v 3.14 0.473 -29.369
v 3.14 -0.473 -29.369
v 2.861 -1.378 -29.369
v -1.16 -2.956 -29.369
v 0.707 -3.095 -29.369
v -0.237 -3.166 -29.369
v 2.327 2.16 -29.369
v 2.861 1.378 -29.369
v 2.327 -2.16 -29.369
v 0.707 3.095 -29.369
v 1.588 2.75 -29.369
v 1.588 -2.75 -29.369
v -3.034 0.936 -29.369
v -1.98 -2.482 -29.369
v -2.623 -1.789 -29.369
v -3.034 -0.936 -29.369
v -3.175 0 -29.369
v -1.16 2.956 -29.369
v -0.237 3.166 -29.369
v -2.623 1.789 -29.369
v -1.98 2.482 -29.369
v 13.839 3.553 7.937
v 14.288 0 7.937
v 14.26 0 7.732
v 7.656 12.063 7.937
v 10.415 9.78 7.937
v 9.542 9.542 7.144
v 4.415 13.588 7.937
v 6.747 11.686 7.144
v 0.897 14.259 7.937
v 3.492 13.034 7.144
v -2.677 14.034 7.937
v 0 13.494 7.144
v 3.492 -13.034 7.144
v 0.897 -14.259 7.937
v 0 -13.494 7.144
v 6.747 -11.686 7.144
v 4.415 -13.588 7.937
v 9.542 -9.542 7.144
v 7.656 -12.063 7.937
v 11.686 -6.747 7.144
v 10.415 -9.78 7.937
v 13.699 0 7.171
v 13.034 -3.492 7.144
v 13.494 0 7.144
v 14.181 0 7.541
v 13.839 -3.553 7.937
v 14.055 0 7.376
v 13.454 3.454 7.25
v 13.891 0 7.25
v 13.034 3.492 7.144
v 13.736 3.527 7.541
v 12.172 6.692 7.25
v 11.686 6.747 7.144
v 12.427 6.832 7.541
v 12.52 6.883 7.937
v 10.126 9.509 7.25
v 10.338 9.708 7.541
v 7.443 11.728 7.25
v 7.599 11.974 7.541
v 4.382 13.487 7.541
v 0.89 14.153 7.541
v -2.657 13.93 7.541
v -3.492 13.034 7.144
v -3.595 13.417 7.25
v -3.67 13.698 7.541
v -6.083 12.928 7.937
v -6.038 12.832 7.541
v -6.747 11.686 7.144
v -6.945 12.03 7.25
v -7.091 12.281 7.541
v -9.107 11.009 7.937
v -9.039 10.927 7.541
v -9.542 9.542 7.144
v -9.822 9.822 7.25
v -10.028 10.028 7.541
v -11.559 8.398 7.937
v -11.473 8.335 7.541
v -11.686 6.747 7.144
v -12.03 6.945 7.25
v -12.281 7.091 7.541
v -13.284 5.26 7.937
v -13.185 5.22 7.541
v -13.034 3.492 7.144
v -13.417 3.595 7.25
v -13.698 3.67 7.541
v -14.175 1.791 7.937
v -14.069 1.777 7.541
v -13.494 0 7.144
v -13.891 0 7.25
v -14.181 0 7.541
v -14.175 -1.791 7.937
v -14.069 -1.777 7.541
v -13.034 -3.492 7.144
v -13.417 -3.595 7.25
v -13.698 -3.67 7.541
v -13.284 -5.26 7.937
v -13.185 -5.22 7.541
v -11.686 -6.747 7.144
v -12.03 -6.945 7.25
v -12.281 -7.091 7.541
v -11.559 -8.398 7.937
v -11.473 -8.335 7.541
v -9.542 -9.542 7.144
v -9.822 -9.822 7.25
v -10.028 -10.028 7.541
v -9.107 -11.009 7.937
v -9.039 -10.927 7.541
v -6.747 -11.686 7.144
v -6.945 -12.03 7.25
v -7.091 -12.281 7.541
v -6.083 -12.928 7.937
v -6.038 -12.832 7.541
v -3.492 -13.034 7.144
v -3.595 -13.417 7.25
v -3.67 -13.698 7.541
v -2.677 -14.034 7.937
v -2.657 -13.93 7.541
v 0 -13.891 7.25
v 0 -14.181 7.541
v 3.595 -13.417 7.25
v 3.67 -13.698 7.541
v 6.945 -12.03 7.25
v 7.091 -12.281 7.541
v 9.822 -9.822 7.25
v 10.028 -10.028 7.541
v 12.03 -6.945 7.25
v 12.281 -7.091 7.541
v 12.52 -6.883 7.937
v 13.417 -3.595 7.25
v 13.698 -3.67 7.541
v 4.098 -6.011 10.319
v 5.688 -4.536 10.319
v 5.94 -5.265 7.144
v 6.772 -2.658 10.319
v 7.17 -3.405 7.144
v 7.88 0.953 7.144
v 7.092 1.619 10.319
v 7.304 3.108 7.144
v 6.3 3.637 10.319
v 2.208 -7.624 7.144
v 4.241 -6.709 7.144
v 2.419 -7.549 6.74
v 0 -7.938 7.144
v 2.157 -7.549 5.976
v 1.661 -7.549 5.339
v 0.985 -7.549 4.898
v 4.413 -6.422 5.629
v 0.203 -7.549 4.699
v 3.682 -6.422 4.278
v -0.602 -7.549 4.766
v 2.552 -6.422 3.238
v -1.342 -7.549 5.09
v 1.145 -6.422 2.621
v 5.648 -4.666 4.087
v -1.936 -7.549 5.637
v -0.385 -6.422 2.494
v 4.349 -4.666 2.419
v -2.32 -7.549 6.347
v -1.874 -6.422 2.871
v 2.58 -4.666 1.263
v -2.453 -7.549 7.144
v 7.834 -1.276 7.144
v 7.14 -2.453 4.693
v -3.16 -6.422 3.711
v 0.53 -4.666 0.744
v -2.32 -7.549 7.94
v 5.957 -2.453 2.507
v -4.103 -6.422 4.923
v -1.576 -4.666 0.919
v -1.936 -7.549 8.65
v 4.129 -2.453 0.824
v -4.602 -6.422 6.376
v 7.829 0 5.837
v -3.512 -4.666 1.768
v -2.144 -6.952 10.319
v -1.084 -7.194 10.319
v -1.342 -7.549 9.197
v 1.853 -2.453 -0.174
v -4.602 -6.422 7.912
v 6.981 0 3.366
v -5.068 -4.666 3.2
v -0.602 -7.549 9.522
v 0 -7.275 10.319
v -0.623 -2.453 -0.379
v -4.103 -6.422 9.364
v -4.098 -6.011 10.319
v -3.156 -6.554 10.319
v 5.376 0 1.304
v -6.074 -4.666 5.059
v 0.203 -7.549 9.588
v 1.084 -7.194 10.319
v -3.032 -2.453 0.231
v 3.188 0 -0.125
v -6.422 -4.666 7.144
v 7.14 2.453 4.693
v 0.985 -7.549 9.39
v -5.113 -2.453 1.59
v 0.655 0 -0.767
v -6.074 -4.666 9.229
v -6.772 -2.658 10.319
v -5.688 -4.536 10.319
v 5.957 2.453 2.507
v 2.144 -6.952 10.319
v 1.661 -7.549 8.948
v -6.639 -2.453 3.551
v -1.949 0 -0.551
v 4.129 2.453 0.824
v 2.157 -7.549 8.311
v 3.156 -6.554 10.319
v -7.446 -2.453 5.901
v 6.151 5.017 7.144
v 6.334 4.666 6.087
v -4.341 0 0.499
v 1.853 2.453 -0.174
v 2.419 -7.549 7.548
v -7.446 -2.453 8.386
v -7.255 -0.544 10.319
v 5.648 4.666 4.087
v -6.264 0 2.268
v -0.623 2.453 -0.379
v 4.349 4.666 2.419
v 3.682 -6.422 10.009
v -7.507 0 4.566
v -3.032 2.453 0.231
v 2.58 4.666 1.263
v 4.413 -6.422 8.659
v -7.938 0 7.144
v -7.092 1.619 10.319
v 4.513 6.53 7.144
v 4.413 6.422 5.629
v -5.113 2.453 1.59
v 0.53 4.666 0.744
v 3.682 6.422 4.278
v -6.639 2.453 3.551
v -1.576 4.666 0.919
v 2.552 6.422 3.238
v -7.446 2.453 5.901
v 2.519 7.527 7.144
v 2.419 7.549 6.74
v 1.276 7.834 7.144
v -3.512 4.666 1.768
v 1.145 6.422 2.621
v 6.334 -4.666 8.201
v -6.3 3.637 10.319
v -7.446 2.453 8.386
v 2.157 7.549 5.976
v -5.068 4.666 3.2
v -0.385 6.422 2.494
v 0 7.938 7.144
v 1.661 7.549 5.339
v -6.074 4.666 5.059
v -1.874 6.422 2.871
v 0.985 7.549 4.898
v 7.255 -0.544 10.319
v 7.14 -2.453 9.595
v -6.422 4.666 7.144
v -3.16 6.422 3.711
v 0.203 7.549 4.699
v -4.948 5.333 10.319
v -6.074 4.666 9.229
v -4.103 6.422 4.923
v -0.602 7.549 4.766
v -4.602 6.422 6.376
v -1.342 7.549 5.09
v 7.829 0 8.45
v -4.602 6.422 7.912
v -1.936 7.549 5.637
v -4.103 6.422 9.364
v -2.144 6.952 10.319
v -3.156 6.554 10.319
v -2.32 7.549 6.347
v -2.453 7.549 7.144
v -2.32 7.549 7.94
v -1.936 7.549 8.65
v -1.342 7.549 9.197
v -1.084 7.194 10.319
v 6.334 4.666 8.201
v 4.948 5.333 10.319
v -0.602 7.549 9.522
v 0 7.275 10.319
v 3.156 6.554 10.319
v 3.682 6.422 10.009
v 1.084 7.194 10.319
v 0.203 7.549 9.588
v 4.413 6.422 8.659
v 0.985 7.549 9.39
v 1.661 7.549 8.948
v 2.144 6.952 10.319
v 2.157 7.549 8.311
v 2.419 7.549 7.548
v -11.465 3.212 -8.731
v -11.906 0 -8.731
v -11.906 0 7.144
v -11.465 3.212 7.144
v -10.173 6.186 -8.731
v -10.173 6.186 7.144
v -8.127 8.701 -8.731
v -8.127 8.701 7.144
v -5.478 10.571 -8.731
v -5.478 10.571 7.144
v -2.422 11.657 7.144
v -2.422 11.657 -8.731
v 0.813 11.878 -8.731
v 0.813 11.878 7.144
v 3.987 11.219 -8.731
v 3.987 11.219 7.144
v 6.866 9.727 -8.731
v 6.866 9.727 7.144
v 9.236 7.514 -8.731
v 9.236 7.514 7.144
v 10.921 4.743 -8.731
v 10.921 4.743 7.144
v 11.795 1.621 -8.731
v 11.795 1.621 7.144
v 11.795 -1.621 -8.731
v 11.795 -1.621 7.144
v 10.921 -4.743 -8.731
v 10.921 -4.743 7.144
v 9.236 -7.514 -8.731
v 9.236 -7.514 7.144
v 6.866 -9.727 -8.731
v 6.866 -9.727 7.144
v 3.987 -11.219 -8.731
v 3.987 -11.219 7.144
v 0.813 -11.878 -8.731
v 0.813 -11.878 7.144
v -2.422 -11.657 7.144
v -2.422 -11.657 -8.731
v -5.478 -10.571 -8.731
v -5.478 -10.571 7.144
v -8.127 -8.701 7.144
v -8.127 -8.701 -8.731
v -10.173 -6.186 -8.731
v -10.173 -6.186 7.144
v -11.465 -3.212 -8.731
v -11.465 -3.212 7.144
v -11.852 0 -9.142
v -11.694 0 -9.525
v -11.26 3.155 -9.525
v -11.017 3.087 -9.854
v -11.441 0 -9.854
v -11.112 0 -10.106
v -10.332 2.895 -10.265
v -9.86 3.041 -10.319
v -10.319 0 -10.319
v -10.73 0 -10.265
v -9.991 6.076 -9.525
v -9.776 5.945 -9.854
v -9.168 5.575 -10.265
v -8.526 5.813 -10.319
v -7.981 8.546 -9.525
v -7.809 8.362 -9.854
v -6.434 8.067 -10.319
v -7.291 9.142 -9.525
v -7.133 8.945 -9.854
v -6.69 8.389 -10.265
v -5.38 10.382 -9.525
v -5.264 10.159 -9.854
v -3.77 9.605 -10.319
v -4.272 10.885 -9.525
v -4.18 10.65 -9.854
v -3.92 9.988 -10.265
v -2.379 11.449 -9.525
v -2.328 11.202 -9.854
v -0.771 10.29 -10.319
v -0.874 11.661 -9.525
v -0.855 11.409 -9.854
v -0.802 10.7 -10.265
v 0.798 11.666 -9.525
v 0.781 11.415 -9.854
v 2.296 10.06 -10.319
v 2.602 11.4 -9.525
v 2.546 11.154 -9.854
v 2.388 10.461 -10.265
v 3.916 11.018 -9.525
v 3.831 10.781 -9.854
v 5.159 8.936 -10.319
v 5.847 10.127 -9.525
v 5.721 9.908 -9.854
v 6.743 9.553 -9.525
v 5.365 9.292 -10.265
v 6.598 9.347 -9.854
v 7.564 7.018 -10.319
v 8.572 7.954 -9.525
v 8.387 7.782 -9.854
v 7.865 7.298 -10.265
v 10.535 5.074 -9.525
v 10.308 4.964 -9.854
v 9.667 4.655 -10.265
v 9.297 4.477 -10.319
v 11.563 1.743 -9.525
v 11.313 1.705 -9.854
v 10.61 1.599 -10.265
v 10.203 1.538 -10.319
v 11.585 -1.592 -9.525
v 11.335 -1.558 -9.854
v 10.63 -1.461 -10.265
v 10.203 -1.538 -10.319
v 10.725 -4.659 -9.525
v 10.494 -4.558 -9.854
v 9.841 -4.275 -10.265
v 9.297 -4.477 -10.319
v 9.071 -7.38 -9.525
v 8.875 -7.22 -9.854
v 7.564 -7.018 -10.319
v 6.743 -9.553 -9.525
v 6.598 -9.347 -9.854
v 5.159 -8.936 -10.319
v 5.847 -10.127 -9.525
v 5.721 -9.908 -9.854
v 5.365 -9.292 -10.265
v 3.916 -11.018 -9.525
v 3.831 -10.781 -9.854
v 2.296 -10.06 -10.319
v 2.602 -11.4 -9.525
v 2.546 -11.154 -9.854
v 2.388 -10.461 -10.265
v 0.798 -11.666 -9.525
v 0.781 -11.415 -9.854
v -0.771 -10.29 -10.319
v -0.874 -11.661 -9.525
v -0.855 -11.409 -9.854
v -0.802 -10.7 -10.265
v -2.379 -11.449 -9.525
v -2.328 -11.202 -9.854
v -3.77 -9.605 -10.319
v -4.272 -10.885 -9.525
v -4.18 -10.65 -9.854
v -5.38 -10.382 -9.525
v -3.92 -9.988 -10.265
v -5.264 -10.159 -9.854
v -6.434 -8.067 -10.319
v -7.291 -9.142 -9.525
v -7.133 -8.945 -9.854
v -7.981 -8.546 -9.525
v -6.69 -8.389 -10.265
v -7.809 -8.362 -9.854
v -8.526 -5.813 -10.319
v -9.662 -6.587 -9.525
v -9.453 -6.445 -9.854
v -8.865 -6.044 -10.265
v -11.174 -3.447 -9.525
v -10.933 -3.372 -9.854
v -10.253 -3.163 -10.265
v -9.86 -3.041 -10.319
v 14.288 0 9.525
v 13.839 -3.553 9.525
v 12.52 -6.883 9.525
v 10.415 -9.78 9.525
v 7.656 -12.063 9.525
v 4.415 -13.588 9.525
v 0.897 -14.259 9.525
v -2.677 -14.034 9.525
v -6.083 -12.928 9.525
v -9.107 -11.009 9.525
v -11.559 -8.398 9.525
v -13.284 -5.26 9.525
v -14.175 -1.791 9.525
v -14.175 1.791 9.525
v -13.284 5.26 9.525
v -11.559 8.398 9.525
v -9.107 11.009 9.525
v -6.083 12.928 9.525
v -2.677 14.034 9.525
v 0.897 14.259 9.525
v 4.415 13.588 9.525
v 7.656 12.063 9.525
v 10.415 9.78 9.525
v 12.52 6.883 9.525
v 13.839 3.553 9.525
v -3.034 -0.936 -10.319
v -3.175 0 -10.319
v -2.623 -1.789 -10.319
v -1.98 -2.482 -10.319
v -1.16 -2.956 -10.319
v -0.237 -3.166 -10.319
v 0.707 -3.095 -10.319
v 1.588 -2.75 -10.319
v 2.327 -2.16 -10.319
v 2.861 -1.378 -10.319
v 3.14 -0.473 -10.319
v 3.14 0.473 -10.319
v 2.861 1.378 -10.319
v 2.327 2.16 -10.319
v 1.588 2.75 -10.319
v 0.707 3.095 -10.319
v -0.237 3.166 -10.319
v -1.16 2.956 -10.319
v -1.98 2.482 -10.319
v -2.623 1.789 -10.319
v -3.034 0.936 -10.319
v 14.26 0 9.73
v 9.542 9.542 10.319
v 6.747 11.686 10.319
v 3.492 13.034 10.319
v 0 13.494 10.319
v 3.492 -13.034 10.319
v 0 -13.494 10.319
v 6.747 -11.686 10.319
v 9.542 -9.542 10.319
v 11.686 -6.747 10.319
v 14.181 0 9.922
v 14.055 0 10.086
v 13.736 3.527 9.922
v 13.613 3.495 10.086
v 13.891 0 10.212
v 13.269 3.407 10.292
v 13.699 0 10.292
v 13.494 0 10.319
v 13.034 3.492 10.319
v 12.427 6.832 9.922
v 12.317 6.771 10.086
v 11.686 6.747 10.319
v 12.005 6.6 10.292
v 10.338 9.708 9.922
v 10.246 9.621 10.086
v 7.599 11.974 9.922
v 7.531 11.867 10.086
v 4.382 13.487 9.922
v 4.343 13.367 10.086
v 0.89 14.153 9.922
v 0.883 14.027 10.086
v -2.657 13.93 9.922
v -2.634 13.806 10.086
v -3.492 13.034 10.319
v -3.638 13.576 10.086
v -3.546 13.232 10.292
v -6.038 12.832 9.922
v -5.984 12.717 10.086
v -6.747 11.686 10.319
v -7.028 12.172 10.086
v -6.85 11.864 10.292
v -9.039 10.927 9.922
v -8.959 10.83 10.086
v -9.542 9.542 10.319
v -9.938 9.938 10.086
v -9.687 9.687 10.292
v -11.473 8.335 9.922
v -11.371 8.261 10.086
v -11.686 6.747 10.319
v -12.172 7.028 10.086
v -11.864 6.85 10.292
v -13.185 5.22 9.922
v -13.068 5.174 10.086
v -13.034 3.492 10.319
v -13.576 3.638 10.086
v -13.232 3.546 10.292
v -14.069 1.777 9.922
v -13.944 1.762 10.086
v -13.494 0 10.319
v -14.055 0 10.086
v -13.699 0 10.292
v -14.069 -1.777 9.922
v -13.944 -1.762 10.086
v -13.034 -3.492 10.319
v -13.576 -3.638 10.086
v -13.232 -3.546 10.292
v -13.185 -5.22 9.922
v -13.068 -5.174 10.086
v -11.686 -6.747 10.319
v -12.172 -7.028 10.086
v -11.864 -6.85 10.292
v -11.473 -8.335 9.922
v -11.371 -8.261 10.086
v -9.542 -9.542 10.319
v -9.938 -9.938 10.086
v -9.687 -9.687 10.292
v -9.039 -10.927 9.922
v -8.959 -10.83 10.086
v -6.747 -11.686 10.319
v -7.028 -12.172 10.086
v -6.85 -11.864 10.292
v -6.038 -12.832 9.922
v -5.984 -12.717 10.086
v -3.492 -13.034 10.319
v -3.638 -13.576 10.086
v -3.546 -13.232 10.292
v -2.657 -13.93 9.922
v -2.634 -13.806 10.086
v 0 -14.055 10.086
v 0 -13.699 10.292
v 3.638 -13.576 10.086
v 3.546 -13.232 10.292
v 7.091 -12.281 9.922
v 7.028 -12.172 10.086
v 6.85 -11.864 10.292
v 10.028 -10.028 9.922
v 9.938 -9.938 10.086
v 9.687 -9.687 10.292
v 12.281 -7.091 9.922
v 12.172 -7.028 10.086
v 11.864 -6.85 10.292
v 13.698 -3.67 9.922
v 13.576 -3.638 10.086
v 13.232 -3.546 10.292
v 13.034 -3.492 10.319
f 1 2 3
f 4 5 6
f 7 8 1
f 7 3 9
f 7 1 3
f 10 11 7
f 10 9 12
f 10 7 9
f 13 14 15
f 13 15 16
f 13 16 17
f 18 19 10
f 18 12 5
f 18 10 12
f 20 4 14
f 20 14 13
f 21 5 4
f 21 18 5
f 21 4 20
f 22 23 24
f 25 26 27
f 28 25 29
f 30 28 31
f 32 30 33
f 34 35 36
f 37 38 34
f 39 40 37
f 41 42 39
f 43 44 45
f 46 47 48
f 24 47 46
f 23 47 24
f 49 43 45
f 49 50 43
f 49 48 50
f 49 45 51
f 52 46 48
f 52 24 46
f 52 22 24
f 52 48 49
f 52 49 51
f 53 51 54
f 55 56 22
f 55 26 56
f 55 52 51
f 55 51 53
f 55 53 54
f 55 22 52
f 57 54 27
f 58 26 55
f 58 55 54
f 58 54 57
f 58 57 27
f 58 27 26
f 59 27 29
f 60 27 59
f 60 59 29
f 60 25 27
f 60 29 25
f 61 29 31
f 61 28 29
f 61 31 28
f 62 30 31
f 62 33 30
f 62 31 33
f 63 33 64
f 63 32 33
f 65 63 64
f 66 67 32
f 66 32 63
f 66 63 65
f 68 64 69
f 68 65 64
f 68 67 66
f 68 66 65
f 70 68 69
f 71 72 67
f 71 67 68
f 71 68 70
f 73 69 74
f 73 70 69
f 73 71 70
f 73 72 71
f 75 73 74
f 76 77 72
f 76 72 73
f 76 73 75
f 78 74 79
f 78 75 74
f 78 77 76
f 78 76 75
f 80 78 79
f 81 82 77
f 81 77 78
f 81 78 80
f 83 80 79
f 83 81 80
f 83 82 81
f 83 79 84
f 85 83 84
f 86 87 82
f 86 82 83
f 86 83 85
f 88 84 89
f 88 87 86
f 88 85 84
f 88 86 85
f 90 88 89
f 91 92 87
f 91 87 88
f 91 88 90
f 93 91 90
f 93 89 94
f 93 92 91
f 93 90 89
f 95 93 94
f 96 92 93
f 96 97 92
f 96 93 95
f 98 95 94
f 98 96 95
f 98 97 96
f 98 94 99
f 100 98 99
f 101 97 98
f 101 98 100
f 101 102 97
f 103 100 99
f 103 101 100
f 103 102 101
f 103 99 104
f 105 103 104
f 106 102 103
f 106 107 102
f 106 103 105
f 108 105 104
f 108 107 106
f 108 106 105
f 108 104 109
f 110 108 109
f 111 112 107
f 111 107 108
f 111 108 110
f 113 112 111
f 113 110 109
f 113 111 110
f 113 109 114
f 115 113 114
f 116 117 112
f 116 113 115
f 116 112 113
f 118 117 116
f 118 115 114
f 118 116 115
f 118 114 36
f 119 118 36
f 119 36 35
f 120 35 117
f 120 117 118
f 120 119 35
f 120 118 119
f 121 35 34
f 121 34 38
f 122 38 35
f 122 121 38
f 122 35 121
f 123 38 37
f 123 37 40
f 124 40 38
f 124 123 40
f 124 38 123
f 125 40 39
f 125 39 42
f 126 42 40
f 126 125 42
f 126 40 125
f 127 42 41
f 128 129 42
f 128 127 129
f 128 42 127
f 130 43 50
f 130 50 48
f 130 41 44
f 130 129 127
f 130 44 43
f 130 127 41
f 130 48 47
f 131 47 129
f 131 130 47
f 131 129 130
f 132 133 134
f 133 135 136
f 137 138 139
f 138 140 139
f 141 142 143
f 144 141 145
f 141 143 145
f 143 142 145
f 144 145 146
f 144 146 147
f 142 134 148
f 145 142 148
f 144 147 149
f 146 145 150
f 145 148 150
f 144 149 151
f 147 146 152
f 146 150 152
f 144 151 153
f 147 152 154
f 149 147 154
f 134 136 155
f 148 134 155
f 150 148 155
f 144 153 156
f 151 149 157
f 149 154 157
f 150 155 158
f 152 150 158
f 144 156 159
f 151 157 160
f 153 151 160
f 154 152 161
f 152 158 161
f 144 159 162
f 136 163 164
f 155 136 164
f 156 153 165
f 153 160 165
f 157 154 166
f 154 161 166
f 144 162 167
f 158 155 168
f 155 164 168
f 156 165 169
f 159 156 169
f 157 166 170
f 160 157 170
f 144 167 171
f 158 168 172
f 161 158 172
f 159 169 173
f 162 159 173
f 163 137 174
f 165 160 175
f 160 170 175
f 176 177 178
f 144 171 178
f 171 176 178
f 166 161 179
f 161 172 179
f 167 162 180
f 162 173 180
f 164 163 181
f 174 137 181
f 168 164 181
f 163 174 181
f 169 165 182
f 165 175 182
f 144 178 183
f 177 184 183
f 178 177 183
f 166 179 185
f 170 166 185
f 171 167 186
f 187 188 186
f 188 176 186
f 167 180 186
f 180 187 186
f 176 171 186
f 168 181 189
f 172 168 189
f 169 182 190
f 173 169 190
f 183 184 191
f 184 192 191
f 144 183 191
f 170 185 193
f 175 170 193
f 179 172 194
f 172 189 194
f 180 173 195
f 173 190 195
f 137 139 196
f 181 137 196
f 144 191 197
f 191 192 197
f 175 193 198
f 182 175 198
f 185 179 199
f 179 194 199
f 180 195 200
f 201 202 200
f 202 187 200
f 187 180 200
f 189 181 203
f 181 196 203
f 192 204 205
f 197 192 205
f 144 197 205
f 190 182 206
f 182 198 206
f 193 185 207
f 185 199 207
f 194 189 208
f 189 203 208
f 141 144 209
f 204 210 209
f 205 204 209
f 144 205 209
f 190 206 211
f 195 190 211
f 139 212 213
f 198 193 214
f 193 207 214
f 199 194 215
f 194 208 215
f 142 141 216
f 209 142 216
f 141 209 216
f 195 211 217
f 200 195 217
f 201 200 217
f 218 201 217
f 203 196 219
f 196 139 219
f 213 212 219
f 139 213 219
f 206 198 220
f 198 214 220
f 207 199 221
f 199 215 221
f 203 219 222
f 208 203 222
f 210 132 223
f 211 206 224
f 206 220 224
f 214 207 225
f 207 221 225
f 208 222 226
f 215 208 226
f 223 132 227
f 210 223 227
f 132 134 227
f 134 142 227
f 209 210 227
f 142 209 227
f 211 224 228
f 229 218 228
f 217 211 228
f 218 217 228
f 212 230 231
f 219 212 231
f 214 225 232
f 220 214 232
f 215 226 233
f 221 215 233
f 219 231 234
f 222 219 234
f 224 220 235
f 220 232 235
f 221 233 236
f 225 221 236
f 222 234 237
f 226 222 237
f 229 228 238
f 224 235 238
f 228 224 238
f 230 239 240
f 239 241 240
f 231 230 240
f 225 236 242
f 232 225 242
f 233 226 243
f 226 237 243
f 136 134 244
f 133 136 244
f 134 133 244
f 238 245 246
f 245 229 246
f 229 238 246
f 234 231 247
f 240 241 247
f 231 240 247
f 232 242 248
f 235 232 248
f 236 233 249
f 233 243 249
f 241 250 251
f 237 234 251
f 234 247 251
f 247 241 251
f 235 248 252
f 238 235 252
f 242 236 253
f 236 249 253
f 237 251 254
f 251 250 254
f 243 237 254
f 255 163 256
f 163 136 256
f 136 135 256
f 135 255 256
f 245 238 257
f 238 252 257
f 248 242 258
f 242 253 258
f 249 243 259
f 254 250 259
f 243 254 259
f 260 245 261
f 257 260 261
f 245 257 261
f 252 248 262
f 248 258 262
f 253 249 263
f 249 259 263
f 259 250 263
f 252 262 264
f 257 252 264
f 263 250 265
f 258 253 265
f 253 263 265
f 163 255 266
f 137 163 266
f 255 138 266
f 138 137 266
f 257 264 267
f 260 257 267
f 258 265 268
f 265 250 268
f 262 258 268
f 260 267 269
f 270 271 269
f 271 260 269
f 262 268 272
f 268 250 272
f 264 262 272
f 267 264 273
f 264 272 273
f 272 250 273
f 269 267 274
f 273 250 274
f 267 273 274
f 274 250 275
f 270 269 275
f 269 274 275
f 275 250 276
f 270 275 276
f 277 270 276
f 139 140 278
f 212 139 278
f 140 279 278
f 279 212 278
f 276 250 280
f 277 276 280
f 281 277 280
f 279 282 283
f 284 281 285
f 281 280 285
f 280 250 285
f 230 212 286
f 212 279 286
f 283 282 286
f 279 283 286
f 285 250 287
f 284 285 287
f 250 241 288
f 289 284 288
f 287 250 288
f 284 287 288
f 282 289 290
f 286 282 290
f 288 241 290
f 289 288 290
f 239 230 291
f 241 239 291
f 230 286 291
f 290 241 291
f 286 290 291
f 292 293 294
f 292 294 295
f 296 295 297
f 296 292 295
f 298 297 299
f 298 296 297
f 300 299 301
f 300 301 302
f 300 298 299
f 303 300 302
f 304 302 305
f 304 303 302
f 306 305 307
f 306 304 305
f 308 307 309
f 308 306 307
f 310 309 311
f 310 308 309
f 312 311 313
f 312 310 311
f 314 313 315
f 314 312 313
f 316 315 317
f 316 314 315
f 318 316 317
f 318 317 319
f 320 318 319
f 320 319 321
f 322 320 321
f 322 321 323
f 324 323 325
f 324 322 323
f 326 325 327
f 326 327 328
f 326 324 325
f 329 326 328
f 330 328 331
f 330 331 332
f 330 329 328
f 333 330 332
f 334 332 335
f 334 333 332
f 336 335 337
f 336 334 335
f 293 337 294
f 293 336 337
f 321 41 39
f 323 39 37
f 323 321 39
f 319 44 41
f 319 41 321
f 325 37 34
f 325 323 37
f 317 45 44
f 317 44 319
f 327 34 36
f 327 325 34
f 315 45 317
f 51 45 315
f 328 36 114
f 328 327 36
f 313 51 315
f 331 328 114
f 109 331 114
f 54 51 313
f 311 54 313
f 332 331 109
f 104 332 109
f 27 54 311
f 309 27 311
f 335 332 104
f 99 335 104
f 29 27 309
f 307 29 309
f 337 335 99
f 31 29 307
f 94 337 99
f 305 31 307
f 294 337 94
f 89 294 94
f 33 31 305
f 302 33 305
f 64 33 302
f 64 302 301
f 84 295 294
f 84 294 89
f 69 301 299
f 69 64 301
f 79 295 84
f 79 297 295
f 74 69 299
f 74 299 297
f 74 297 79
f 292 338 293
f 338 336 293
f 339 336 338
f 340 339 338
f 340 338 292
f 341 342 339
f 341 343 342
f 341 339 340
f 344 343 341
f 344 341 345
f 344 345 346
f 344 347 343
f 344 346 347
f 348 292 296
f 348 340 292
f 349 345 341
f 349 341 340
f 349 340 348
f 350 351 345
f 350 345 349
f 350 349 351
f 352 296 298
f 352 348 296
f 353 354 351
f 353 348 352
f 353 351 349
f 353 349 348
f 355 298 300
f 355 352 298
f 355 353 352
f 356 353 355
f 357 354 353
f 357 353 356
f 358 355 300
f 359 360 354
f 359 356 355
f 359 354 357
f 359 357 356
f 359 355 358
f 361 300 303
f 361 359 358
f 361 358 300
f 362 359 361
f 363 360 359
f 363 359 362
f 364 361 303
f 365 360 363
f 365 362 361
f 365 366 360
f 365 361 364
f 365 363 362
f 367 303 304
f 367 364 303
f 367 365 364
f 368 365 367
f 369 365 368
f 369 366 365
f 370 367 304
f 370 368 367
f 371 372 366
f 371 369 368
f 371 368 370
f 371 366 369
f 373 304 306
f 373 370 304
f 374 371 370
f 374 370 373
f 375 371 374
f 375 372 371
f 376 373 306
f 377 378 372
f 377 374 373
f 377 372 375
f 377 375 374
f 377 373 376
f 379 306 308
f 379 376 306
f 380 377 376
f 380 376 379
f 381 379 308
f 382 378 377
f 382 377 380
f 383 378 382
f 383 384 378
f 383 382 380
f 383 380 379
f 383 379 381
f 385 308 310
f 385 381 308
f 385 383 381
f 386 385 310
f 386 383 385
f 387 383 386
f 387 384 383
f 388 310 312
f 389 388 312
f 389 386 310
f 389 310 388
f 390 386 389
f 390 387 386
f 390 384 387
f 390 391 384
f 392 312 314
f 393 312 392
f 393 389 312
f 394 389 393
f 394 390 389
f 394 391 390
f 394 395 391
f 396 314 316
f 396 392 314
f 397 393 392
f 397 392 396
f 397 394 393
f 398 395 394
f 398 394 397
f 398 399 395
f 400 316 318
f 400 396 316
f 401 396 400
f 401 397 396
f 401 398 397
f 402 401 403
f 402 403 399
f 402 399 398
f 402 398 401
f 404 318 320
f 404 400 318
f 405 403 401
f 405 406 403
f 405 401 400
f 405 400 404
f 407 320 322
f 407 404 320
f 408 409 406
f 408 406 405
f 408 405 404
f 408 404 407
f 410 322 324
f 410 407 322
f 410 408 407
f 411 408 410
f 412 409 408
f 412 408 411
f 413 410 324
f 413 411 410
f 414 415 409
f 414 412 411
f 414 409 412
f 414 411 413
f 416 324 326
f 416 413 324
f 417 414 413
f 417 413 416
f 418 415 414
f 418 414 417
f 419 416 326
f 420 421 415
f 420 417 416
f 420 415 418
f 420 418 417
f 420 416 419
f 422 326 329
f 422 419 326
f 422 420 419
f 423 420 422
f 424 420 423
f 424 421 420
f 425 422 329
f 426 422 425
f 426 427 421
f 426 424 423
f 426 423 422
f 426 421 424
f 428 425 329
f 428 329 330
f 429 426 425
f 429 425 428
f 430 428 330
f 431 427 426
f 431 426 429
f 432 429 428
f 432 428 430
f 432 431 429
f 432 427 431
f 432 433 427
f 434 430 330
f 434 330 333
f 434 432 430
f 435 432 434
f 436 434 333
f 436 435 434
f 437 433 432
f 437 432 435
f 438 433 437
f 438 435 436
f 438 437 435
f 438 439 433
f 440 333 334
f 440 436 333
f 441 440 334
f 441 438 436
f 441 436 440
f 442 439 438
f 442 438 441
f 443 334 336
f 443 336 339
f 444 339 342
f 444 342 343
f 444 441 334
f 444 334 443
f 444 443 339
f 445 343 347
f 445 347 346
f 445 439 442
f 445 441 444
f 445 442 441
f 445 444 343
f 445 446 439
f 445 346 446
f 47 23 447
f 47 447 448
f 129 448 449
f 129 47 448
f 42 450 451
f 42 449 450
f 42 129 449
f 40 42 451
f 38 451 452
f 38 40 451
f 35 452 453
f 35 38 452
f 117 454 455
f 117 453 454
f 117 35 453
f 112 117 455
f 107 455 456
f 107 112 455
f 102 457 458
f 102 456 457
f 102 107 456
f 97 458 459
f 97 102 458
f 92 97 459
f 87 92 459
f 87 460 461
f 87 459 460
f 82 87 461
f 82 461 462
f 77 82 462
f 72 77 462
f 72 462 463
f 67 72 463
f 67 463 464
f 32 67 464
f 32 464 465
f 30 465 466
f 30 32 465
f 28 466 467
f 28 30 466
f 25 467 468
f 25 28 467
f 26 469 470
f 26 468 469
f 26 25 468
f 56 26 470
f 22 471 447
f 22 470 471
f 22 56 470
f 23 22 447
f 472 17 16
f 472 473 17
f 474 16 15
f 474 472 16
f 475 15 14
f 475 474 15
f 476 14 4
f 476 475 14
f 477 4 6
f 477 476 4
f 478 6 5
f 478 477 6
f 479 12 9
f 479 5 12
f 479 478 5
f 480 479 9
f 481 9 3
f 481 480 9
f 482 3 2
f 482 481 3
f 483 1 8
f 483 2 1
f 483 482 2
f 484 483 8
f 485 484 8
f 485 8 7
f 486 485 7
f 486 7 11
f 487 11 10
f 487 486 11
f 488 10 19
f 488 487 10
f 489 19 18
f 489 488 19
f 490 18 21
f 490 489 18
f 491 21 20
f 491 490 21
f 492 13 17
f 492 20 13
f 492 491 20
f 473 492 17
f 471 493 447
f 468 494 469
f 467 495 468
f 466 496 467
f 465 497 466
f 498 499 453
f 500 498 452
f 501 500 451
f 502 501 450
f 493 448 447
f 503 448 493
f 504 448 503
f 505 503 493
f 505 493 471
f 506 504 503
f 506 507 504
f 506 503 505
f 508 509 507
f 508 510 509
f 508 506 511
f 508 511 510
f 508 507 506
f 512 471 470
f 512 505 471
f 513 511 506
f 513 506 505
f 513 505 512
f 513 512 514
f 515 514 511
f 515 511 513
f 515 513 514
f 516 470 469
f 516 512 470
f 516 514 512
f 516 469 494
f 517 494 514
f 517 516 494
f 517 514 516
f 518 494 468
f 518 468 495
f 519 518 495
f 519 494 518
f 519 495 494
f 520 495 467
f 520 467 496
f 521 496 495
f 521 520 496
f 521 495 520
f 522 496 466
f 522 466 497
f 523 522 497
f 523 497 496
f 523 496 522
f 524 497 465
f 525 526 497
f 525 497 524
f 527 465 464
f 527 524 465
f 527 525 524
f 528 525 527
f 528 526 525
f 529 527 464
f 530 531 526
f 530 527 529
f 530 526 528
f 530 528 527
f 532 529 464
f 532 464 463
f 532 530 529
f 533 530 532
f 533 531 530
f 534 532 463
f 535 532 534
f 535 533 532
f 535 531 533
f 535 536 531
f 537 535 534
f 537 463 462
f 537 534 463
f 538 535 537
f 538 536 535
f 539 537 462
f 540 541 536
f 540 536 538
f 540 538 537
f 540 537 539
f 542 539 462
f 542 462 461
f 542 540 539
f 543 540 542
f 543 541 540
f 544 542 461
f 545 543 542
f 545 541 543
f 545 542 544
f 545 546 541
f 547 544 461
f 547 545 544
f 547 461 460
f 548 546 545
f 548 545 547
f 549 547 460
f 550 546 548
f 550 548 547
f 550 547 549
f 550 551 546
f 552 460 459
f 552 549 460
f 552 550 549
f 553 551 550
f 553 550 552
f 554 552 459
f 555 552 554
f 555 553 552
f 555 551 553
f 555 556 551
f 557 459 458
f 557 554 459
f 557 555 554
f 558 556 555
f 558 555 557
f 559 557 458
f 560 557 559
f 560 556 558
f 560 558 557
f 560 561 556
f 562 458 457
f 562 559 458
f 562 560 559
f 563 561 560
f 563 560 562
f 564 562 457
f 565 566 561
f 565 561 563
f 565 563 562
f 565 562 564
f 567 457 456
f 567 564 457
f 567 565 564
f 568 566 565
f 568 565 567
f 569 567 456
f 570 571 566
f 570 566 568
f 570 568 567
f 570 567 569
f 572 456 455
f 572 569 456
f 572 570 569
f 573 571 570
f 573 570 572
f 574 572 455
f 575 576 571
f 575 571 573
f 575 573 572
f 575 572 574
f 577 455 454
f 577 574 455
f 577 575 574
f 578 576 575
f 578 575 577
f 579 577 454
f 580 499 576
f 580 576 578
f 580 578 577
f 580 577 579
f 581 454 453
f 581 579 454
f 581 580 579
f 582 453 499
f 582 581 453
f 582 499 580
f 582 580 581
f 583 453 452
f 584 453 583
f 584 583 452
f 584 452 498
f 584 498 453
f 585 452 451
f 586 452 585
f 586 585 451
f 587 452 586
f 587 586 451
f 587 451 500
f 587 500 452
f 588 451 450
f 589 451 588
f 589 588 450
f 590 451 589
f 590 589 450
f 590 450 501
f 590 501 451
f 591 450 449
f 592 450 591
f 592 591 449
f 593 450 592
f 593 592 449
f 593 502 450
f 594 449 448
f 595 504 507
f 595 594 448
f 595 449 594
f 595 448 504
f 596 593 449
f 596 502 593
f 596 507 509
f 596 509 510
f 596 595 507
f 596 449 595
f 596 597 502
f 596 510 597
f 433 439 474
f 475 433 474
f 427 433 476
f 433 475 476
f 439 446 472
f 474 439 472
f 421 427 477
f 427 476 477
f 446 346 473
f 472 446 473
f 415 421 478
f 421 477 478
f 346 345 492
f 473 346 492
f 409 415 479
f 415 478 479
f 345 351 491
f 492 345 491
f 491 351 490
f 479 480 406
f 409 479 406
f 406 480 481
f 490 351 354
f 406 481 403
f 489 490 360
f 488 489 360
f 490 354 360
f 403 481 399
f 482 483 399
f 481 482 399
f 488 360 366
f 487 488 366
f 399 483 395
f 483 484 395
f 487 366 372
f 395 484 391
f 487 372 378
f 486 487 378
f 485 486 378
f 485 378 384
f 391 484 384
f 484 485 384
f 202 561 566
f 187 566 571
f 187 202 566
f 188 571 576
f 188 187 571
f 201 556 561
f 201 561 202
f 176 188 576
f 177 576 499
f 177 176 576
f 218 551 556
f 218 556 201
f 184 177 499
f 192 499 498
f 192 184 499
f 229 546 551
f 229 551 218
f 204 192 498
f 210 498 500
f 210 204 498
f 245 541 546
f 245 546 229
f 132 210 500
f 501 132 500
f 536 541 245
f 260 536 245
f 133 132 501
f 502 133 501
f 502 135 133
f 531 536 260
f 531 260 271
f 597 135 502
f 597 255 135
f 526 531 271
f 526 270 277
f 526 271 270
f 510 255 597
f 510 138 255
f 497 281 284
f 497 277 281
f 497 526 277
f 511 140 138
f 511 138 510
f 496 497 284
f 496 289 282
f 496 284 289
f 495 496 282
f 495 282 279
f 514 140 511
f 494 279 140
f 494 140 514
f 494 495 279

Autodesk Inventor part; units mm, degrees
ref_plane "YZ Plane" through (0, 0, 0) normal (1, 0, 0) x (0, 1, 0)
ref_plane "XZ Plane" through (0, 0, 0) normal (0, 1, 0) x (-1, 0, 0)
sketch "Sketch1" plane through (0, 0, 0) normal (0, 0, 1) x (1, 0, 0)
  circle A0 centre (0, 0) radius 14.2875
  dimension "d0" = 28.575
extrude "Extrusion1" add sketch "Sketch1" along normal mid plane 20.6375
sketch "Sketch2" plane through (0, 0, -10.3188) normal (0, 0, -1) x (-1, 0, 0)
  circle A0 centre (0, 0) radius 14.2875 projected
  circle A1 centre (0, 0) radius 11.9062
  dimension "d3" = 23.8125
extrude "Extrusion2" cut sketch "Sketch2" against normal blind 17.4625
sketch "Sketch3" plane through (0, 0, -10.3188) normal (0, 0, -1) x (-1, 0, 0)
  circle A0 centre (0, 0) radius 11.9062 projected
  circle A1 centre (0, 0) radius 3.175
  dimension "d6" = 6.35
extrude "Extrusion3" add sketch "Sketch3" along normal blind 19.05 contours A1
thread "Thread1" size "1/4-20 UNC" class "2A" standard "ANSI Unified Screw Threads" full length
ref_plane "Work Plane1" through (0, 0, 7.1438) normal (0, 0, 1) x (1, 0, 0)
sketch "Sketch4" plane through (0, 0, 7.1438) normal (0, 0, 1) x (1, 0, 0)
  line L0 (-20.0025, 0) -> (20.0025, 0) projected
  line L1 (0, -20.0025) -> (0, 20.0025) projected
  arc A0 (0, -7.9375) -> (0, 7.9375) centre (0, 0) ccw
  line L2 (0, -7.9375) -> (0, 7.9375)
  dimension "d12" = 15.875
revolve "Revolution1" cut sketch "Sketch4" angle 360 about axis through (0, -10, 7.1438) along (0, 1, 0)
fillet "Fillet1" radius 1.5875 1 edges at (11.9062, 0, -10.3188)
fillet "Fillet2" radius 0.7937 1 edges at (-14.2875, 0, 7.1438)
fillet "Fillet3" radius 0.7937 1 edges at (-14.2875, 0, 10.3188)
properties part number "transfer_housing" material "Steel"
